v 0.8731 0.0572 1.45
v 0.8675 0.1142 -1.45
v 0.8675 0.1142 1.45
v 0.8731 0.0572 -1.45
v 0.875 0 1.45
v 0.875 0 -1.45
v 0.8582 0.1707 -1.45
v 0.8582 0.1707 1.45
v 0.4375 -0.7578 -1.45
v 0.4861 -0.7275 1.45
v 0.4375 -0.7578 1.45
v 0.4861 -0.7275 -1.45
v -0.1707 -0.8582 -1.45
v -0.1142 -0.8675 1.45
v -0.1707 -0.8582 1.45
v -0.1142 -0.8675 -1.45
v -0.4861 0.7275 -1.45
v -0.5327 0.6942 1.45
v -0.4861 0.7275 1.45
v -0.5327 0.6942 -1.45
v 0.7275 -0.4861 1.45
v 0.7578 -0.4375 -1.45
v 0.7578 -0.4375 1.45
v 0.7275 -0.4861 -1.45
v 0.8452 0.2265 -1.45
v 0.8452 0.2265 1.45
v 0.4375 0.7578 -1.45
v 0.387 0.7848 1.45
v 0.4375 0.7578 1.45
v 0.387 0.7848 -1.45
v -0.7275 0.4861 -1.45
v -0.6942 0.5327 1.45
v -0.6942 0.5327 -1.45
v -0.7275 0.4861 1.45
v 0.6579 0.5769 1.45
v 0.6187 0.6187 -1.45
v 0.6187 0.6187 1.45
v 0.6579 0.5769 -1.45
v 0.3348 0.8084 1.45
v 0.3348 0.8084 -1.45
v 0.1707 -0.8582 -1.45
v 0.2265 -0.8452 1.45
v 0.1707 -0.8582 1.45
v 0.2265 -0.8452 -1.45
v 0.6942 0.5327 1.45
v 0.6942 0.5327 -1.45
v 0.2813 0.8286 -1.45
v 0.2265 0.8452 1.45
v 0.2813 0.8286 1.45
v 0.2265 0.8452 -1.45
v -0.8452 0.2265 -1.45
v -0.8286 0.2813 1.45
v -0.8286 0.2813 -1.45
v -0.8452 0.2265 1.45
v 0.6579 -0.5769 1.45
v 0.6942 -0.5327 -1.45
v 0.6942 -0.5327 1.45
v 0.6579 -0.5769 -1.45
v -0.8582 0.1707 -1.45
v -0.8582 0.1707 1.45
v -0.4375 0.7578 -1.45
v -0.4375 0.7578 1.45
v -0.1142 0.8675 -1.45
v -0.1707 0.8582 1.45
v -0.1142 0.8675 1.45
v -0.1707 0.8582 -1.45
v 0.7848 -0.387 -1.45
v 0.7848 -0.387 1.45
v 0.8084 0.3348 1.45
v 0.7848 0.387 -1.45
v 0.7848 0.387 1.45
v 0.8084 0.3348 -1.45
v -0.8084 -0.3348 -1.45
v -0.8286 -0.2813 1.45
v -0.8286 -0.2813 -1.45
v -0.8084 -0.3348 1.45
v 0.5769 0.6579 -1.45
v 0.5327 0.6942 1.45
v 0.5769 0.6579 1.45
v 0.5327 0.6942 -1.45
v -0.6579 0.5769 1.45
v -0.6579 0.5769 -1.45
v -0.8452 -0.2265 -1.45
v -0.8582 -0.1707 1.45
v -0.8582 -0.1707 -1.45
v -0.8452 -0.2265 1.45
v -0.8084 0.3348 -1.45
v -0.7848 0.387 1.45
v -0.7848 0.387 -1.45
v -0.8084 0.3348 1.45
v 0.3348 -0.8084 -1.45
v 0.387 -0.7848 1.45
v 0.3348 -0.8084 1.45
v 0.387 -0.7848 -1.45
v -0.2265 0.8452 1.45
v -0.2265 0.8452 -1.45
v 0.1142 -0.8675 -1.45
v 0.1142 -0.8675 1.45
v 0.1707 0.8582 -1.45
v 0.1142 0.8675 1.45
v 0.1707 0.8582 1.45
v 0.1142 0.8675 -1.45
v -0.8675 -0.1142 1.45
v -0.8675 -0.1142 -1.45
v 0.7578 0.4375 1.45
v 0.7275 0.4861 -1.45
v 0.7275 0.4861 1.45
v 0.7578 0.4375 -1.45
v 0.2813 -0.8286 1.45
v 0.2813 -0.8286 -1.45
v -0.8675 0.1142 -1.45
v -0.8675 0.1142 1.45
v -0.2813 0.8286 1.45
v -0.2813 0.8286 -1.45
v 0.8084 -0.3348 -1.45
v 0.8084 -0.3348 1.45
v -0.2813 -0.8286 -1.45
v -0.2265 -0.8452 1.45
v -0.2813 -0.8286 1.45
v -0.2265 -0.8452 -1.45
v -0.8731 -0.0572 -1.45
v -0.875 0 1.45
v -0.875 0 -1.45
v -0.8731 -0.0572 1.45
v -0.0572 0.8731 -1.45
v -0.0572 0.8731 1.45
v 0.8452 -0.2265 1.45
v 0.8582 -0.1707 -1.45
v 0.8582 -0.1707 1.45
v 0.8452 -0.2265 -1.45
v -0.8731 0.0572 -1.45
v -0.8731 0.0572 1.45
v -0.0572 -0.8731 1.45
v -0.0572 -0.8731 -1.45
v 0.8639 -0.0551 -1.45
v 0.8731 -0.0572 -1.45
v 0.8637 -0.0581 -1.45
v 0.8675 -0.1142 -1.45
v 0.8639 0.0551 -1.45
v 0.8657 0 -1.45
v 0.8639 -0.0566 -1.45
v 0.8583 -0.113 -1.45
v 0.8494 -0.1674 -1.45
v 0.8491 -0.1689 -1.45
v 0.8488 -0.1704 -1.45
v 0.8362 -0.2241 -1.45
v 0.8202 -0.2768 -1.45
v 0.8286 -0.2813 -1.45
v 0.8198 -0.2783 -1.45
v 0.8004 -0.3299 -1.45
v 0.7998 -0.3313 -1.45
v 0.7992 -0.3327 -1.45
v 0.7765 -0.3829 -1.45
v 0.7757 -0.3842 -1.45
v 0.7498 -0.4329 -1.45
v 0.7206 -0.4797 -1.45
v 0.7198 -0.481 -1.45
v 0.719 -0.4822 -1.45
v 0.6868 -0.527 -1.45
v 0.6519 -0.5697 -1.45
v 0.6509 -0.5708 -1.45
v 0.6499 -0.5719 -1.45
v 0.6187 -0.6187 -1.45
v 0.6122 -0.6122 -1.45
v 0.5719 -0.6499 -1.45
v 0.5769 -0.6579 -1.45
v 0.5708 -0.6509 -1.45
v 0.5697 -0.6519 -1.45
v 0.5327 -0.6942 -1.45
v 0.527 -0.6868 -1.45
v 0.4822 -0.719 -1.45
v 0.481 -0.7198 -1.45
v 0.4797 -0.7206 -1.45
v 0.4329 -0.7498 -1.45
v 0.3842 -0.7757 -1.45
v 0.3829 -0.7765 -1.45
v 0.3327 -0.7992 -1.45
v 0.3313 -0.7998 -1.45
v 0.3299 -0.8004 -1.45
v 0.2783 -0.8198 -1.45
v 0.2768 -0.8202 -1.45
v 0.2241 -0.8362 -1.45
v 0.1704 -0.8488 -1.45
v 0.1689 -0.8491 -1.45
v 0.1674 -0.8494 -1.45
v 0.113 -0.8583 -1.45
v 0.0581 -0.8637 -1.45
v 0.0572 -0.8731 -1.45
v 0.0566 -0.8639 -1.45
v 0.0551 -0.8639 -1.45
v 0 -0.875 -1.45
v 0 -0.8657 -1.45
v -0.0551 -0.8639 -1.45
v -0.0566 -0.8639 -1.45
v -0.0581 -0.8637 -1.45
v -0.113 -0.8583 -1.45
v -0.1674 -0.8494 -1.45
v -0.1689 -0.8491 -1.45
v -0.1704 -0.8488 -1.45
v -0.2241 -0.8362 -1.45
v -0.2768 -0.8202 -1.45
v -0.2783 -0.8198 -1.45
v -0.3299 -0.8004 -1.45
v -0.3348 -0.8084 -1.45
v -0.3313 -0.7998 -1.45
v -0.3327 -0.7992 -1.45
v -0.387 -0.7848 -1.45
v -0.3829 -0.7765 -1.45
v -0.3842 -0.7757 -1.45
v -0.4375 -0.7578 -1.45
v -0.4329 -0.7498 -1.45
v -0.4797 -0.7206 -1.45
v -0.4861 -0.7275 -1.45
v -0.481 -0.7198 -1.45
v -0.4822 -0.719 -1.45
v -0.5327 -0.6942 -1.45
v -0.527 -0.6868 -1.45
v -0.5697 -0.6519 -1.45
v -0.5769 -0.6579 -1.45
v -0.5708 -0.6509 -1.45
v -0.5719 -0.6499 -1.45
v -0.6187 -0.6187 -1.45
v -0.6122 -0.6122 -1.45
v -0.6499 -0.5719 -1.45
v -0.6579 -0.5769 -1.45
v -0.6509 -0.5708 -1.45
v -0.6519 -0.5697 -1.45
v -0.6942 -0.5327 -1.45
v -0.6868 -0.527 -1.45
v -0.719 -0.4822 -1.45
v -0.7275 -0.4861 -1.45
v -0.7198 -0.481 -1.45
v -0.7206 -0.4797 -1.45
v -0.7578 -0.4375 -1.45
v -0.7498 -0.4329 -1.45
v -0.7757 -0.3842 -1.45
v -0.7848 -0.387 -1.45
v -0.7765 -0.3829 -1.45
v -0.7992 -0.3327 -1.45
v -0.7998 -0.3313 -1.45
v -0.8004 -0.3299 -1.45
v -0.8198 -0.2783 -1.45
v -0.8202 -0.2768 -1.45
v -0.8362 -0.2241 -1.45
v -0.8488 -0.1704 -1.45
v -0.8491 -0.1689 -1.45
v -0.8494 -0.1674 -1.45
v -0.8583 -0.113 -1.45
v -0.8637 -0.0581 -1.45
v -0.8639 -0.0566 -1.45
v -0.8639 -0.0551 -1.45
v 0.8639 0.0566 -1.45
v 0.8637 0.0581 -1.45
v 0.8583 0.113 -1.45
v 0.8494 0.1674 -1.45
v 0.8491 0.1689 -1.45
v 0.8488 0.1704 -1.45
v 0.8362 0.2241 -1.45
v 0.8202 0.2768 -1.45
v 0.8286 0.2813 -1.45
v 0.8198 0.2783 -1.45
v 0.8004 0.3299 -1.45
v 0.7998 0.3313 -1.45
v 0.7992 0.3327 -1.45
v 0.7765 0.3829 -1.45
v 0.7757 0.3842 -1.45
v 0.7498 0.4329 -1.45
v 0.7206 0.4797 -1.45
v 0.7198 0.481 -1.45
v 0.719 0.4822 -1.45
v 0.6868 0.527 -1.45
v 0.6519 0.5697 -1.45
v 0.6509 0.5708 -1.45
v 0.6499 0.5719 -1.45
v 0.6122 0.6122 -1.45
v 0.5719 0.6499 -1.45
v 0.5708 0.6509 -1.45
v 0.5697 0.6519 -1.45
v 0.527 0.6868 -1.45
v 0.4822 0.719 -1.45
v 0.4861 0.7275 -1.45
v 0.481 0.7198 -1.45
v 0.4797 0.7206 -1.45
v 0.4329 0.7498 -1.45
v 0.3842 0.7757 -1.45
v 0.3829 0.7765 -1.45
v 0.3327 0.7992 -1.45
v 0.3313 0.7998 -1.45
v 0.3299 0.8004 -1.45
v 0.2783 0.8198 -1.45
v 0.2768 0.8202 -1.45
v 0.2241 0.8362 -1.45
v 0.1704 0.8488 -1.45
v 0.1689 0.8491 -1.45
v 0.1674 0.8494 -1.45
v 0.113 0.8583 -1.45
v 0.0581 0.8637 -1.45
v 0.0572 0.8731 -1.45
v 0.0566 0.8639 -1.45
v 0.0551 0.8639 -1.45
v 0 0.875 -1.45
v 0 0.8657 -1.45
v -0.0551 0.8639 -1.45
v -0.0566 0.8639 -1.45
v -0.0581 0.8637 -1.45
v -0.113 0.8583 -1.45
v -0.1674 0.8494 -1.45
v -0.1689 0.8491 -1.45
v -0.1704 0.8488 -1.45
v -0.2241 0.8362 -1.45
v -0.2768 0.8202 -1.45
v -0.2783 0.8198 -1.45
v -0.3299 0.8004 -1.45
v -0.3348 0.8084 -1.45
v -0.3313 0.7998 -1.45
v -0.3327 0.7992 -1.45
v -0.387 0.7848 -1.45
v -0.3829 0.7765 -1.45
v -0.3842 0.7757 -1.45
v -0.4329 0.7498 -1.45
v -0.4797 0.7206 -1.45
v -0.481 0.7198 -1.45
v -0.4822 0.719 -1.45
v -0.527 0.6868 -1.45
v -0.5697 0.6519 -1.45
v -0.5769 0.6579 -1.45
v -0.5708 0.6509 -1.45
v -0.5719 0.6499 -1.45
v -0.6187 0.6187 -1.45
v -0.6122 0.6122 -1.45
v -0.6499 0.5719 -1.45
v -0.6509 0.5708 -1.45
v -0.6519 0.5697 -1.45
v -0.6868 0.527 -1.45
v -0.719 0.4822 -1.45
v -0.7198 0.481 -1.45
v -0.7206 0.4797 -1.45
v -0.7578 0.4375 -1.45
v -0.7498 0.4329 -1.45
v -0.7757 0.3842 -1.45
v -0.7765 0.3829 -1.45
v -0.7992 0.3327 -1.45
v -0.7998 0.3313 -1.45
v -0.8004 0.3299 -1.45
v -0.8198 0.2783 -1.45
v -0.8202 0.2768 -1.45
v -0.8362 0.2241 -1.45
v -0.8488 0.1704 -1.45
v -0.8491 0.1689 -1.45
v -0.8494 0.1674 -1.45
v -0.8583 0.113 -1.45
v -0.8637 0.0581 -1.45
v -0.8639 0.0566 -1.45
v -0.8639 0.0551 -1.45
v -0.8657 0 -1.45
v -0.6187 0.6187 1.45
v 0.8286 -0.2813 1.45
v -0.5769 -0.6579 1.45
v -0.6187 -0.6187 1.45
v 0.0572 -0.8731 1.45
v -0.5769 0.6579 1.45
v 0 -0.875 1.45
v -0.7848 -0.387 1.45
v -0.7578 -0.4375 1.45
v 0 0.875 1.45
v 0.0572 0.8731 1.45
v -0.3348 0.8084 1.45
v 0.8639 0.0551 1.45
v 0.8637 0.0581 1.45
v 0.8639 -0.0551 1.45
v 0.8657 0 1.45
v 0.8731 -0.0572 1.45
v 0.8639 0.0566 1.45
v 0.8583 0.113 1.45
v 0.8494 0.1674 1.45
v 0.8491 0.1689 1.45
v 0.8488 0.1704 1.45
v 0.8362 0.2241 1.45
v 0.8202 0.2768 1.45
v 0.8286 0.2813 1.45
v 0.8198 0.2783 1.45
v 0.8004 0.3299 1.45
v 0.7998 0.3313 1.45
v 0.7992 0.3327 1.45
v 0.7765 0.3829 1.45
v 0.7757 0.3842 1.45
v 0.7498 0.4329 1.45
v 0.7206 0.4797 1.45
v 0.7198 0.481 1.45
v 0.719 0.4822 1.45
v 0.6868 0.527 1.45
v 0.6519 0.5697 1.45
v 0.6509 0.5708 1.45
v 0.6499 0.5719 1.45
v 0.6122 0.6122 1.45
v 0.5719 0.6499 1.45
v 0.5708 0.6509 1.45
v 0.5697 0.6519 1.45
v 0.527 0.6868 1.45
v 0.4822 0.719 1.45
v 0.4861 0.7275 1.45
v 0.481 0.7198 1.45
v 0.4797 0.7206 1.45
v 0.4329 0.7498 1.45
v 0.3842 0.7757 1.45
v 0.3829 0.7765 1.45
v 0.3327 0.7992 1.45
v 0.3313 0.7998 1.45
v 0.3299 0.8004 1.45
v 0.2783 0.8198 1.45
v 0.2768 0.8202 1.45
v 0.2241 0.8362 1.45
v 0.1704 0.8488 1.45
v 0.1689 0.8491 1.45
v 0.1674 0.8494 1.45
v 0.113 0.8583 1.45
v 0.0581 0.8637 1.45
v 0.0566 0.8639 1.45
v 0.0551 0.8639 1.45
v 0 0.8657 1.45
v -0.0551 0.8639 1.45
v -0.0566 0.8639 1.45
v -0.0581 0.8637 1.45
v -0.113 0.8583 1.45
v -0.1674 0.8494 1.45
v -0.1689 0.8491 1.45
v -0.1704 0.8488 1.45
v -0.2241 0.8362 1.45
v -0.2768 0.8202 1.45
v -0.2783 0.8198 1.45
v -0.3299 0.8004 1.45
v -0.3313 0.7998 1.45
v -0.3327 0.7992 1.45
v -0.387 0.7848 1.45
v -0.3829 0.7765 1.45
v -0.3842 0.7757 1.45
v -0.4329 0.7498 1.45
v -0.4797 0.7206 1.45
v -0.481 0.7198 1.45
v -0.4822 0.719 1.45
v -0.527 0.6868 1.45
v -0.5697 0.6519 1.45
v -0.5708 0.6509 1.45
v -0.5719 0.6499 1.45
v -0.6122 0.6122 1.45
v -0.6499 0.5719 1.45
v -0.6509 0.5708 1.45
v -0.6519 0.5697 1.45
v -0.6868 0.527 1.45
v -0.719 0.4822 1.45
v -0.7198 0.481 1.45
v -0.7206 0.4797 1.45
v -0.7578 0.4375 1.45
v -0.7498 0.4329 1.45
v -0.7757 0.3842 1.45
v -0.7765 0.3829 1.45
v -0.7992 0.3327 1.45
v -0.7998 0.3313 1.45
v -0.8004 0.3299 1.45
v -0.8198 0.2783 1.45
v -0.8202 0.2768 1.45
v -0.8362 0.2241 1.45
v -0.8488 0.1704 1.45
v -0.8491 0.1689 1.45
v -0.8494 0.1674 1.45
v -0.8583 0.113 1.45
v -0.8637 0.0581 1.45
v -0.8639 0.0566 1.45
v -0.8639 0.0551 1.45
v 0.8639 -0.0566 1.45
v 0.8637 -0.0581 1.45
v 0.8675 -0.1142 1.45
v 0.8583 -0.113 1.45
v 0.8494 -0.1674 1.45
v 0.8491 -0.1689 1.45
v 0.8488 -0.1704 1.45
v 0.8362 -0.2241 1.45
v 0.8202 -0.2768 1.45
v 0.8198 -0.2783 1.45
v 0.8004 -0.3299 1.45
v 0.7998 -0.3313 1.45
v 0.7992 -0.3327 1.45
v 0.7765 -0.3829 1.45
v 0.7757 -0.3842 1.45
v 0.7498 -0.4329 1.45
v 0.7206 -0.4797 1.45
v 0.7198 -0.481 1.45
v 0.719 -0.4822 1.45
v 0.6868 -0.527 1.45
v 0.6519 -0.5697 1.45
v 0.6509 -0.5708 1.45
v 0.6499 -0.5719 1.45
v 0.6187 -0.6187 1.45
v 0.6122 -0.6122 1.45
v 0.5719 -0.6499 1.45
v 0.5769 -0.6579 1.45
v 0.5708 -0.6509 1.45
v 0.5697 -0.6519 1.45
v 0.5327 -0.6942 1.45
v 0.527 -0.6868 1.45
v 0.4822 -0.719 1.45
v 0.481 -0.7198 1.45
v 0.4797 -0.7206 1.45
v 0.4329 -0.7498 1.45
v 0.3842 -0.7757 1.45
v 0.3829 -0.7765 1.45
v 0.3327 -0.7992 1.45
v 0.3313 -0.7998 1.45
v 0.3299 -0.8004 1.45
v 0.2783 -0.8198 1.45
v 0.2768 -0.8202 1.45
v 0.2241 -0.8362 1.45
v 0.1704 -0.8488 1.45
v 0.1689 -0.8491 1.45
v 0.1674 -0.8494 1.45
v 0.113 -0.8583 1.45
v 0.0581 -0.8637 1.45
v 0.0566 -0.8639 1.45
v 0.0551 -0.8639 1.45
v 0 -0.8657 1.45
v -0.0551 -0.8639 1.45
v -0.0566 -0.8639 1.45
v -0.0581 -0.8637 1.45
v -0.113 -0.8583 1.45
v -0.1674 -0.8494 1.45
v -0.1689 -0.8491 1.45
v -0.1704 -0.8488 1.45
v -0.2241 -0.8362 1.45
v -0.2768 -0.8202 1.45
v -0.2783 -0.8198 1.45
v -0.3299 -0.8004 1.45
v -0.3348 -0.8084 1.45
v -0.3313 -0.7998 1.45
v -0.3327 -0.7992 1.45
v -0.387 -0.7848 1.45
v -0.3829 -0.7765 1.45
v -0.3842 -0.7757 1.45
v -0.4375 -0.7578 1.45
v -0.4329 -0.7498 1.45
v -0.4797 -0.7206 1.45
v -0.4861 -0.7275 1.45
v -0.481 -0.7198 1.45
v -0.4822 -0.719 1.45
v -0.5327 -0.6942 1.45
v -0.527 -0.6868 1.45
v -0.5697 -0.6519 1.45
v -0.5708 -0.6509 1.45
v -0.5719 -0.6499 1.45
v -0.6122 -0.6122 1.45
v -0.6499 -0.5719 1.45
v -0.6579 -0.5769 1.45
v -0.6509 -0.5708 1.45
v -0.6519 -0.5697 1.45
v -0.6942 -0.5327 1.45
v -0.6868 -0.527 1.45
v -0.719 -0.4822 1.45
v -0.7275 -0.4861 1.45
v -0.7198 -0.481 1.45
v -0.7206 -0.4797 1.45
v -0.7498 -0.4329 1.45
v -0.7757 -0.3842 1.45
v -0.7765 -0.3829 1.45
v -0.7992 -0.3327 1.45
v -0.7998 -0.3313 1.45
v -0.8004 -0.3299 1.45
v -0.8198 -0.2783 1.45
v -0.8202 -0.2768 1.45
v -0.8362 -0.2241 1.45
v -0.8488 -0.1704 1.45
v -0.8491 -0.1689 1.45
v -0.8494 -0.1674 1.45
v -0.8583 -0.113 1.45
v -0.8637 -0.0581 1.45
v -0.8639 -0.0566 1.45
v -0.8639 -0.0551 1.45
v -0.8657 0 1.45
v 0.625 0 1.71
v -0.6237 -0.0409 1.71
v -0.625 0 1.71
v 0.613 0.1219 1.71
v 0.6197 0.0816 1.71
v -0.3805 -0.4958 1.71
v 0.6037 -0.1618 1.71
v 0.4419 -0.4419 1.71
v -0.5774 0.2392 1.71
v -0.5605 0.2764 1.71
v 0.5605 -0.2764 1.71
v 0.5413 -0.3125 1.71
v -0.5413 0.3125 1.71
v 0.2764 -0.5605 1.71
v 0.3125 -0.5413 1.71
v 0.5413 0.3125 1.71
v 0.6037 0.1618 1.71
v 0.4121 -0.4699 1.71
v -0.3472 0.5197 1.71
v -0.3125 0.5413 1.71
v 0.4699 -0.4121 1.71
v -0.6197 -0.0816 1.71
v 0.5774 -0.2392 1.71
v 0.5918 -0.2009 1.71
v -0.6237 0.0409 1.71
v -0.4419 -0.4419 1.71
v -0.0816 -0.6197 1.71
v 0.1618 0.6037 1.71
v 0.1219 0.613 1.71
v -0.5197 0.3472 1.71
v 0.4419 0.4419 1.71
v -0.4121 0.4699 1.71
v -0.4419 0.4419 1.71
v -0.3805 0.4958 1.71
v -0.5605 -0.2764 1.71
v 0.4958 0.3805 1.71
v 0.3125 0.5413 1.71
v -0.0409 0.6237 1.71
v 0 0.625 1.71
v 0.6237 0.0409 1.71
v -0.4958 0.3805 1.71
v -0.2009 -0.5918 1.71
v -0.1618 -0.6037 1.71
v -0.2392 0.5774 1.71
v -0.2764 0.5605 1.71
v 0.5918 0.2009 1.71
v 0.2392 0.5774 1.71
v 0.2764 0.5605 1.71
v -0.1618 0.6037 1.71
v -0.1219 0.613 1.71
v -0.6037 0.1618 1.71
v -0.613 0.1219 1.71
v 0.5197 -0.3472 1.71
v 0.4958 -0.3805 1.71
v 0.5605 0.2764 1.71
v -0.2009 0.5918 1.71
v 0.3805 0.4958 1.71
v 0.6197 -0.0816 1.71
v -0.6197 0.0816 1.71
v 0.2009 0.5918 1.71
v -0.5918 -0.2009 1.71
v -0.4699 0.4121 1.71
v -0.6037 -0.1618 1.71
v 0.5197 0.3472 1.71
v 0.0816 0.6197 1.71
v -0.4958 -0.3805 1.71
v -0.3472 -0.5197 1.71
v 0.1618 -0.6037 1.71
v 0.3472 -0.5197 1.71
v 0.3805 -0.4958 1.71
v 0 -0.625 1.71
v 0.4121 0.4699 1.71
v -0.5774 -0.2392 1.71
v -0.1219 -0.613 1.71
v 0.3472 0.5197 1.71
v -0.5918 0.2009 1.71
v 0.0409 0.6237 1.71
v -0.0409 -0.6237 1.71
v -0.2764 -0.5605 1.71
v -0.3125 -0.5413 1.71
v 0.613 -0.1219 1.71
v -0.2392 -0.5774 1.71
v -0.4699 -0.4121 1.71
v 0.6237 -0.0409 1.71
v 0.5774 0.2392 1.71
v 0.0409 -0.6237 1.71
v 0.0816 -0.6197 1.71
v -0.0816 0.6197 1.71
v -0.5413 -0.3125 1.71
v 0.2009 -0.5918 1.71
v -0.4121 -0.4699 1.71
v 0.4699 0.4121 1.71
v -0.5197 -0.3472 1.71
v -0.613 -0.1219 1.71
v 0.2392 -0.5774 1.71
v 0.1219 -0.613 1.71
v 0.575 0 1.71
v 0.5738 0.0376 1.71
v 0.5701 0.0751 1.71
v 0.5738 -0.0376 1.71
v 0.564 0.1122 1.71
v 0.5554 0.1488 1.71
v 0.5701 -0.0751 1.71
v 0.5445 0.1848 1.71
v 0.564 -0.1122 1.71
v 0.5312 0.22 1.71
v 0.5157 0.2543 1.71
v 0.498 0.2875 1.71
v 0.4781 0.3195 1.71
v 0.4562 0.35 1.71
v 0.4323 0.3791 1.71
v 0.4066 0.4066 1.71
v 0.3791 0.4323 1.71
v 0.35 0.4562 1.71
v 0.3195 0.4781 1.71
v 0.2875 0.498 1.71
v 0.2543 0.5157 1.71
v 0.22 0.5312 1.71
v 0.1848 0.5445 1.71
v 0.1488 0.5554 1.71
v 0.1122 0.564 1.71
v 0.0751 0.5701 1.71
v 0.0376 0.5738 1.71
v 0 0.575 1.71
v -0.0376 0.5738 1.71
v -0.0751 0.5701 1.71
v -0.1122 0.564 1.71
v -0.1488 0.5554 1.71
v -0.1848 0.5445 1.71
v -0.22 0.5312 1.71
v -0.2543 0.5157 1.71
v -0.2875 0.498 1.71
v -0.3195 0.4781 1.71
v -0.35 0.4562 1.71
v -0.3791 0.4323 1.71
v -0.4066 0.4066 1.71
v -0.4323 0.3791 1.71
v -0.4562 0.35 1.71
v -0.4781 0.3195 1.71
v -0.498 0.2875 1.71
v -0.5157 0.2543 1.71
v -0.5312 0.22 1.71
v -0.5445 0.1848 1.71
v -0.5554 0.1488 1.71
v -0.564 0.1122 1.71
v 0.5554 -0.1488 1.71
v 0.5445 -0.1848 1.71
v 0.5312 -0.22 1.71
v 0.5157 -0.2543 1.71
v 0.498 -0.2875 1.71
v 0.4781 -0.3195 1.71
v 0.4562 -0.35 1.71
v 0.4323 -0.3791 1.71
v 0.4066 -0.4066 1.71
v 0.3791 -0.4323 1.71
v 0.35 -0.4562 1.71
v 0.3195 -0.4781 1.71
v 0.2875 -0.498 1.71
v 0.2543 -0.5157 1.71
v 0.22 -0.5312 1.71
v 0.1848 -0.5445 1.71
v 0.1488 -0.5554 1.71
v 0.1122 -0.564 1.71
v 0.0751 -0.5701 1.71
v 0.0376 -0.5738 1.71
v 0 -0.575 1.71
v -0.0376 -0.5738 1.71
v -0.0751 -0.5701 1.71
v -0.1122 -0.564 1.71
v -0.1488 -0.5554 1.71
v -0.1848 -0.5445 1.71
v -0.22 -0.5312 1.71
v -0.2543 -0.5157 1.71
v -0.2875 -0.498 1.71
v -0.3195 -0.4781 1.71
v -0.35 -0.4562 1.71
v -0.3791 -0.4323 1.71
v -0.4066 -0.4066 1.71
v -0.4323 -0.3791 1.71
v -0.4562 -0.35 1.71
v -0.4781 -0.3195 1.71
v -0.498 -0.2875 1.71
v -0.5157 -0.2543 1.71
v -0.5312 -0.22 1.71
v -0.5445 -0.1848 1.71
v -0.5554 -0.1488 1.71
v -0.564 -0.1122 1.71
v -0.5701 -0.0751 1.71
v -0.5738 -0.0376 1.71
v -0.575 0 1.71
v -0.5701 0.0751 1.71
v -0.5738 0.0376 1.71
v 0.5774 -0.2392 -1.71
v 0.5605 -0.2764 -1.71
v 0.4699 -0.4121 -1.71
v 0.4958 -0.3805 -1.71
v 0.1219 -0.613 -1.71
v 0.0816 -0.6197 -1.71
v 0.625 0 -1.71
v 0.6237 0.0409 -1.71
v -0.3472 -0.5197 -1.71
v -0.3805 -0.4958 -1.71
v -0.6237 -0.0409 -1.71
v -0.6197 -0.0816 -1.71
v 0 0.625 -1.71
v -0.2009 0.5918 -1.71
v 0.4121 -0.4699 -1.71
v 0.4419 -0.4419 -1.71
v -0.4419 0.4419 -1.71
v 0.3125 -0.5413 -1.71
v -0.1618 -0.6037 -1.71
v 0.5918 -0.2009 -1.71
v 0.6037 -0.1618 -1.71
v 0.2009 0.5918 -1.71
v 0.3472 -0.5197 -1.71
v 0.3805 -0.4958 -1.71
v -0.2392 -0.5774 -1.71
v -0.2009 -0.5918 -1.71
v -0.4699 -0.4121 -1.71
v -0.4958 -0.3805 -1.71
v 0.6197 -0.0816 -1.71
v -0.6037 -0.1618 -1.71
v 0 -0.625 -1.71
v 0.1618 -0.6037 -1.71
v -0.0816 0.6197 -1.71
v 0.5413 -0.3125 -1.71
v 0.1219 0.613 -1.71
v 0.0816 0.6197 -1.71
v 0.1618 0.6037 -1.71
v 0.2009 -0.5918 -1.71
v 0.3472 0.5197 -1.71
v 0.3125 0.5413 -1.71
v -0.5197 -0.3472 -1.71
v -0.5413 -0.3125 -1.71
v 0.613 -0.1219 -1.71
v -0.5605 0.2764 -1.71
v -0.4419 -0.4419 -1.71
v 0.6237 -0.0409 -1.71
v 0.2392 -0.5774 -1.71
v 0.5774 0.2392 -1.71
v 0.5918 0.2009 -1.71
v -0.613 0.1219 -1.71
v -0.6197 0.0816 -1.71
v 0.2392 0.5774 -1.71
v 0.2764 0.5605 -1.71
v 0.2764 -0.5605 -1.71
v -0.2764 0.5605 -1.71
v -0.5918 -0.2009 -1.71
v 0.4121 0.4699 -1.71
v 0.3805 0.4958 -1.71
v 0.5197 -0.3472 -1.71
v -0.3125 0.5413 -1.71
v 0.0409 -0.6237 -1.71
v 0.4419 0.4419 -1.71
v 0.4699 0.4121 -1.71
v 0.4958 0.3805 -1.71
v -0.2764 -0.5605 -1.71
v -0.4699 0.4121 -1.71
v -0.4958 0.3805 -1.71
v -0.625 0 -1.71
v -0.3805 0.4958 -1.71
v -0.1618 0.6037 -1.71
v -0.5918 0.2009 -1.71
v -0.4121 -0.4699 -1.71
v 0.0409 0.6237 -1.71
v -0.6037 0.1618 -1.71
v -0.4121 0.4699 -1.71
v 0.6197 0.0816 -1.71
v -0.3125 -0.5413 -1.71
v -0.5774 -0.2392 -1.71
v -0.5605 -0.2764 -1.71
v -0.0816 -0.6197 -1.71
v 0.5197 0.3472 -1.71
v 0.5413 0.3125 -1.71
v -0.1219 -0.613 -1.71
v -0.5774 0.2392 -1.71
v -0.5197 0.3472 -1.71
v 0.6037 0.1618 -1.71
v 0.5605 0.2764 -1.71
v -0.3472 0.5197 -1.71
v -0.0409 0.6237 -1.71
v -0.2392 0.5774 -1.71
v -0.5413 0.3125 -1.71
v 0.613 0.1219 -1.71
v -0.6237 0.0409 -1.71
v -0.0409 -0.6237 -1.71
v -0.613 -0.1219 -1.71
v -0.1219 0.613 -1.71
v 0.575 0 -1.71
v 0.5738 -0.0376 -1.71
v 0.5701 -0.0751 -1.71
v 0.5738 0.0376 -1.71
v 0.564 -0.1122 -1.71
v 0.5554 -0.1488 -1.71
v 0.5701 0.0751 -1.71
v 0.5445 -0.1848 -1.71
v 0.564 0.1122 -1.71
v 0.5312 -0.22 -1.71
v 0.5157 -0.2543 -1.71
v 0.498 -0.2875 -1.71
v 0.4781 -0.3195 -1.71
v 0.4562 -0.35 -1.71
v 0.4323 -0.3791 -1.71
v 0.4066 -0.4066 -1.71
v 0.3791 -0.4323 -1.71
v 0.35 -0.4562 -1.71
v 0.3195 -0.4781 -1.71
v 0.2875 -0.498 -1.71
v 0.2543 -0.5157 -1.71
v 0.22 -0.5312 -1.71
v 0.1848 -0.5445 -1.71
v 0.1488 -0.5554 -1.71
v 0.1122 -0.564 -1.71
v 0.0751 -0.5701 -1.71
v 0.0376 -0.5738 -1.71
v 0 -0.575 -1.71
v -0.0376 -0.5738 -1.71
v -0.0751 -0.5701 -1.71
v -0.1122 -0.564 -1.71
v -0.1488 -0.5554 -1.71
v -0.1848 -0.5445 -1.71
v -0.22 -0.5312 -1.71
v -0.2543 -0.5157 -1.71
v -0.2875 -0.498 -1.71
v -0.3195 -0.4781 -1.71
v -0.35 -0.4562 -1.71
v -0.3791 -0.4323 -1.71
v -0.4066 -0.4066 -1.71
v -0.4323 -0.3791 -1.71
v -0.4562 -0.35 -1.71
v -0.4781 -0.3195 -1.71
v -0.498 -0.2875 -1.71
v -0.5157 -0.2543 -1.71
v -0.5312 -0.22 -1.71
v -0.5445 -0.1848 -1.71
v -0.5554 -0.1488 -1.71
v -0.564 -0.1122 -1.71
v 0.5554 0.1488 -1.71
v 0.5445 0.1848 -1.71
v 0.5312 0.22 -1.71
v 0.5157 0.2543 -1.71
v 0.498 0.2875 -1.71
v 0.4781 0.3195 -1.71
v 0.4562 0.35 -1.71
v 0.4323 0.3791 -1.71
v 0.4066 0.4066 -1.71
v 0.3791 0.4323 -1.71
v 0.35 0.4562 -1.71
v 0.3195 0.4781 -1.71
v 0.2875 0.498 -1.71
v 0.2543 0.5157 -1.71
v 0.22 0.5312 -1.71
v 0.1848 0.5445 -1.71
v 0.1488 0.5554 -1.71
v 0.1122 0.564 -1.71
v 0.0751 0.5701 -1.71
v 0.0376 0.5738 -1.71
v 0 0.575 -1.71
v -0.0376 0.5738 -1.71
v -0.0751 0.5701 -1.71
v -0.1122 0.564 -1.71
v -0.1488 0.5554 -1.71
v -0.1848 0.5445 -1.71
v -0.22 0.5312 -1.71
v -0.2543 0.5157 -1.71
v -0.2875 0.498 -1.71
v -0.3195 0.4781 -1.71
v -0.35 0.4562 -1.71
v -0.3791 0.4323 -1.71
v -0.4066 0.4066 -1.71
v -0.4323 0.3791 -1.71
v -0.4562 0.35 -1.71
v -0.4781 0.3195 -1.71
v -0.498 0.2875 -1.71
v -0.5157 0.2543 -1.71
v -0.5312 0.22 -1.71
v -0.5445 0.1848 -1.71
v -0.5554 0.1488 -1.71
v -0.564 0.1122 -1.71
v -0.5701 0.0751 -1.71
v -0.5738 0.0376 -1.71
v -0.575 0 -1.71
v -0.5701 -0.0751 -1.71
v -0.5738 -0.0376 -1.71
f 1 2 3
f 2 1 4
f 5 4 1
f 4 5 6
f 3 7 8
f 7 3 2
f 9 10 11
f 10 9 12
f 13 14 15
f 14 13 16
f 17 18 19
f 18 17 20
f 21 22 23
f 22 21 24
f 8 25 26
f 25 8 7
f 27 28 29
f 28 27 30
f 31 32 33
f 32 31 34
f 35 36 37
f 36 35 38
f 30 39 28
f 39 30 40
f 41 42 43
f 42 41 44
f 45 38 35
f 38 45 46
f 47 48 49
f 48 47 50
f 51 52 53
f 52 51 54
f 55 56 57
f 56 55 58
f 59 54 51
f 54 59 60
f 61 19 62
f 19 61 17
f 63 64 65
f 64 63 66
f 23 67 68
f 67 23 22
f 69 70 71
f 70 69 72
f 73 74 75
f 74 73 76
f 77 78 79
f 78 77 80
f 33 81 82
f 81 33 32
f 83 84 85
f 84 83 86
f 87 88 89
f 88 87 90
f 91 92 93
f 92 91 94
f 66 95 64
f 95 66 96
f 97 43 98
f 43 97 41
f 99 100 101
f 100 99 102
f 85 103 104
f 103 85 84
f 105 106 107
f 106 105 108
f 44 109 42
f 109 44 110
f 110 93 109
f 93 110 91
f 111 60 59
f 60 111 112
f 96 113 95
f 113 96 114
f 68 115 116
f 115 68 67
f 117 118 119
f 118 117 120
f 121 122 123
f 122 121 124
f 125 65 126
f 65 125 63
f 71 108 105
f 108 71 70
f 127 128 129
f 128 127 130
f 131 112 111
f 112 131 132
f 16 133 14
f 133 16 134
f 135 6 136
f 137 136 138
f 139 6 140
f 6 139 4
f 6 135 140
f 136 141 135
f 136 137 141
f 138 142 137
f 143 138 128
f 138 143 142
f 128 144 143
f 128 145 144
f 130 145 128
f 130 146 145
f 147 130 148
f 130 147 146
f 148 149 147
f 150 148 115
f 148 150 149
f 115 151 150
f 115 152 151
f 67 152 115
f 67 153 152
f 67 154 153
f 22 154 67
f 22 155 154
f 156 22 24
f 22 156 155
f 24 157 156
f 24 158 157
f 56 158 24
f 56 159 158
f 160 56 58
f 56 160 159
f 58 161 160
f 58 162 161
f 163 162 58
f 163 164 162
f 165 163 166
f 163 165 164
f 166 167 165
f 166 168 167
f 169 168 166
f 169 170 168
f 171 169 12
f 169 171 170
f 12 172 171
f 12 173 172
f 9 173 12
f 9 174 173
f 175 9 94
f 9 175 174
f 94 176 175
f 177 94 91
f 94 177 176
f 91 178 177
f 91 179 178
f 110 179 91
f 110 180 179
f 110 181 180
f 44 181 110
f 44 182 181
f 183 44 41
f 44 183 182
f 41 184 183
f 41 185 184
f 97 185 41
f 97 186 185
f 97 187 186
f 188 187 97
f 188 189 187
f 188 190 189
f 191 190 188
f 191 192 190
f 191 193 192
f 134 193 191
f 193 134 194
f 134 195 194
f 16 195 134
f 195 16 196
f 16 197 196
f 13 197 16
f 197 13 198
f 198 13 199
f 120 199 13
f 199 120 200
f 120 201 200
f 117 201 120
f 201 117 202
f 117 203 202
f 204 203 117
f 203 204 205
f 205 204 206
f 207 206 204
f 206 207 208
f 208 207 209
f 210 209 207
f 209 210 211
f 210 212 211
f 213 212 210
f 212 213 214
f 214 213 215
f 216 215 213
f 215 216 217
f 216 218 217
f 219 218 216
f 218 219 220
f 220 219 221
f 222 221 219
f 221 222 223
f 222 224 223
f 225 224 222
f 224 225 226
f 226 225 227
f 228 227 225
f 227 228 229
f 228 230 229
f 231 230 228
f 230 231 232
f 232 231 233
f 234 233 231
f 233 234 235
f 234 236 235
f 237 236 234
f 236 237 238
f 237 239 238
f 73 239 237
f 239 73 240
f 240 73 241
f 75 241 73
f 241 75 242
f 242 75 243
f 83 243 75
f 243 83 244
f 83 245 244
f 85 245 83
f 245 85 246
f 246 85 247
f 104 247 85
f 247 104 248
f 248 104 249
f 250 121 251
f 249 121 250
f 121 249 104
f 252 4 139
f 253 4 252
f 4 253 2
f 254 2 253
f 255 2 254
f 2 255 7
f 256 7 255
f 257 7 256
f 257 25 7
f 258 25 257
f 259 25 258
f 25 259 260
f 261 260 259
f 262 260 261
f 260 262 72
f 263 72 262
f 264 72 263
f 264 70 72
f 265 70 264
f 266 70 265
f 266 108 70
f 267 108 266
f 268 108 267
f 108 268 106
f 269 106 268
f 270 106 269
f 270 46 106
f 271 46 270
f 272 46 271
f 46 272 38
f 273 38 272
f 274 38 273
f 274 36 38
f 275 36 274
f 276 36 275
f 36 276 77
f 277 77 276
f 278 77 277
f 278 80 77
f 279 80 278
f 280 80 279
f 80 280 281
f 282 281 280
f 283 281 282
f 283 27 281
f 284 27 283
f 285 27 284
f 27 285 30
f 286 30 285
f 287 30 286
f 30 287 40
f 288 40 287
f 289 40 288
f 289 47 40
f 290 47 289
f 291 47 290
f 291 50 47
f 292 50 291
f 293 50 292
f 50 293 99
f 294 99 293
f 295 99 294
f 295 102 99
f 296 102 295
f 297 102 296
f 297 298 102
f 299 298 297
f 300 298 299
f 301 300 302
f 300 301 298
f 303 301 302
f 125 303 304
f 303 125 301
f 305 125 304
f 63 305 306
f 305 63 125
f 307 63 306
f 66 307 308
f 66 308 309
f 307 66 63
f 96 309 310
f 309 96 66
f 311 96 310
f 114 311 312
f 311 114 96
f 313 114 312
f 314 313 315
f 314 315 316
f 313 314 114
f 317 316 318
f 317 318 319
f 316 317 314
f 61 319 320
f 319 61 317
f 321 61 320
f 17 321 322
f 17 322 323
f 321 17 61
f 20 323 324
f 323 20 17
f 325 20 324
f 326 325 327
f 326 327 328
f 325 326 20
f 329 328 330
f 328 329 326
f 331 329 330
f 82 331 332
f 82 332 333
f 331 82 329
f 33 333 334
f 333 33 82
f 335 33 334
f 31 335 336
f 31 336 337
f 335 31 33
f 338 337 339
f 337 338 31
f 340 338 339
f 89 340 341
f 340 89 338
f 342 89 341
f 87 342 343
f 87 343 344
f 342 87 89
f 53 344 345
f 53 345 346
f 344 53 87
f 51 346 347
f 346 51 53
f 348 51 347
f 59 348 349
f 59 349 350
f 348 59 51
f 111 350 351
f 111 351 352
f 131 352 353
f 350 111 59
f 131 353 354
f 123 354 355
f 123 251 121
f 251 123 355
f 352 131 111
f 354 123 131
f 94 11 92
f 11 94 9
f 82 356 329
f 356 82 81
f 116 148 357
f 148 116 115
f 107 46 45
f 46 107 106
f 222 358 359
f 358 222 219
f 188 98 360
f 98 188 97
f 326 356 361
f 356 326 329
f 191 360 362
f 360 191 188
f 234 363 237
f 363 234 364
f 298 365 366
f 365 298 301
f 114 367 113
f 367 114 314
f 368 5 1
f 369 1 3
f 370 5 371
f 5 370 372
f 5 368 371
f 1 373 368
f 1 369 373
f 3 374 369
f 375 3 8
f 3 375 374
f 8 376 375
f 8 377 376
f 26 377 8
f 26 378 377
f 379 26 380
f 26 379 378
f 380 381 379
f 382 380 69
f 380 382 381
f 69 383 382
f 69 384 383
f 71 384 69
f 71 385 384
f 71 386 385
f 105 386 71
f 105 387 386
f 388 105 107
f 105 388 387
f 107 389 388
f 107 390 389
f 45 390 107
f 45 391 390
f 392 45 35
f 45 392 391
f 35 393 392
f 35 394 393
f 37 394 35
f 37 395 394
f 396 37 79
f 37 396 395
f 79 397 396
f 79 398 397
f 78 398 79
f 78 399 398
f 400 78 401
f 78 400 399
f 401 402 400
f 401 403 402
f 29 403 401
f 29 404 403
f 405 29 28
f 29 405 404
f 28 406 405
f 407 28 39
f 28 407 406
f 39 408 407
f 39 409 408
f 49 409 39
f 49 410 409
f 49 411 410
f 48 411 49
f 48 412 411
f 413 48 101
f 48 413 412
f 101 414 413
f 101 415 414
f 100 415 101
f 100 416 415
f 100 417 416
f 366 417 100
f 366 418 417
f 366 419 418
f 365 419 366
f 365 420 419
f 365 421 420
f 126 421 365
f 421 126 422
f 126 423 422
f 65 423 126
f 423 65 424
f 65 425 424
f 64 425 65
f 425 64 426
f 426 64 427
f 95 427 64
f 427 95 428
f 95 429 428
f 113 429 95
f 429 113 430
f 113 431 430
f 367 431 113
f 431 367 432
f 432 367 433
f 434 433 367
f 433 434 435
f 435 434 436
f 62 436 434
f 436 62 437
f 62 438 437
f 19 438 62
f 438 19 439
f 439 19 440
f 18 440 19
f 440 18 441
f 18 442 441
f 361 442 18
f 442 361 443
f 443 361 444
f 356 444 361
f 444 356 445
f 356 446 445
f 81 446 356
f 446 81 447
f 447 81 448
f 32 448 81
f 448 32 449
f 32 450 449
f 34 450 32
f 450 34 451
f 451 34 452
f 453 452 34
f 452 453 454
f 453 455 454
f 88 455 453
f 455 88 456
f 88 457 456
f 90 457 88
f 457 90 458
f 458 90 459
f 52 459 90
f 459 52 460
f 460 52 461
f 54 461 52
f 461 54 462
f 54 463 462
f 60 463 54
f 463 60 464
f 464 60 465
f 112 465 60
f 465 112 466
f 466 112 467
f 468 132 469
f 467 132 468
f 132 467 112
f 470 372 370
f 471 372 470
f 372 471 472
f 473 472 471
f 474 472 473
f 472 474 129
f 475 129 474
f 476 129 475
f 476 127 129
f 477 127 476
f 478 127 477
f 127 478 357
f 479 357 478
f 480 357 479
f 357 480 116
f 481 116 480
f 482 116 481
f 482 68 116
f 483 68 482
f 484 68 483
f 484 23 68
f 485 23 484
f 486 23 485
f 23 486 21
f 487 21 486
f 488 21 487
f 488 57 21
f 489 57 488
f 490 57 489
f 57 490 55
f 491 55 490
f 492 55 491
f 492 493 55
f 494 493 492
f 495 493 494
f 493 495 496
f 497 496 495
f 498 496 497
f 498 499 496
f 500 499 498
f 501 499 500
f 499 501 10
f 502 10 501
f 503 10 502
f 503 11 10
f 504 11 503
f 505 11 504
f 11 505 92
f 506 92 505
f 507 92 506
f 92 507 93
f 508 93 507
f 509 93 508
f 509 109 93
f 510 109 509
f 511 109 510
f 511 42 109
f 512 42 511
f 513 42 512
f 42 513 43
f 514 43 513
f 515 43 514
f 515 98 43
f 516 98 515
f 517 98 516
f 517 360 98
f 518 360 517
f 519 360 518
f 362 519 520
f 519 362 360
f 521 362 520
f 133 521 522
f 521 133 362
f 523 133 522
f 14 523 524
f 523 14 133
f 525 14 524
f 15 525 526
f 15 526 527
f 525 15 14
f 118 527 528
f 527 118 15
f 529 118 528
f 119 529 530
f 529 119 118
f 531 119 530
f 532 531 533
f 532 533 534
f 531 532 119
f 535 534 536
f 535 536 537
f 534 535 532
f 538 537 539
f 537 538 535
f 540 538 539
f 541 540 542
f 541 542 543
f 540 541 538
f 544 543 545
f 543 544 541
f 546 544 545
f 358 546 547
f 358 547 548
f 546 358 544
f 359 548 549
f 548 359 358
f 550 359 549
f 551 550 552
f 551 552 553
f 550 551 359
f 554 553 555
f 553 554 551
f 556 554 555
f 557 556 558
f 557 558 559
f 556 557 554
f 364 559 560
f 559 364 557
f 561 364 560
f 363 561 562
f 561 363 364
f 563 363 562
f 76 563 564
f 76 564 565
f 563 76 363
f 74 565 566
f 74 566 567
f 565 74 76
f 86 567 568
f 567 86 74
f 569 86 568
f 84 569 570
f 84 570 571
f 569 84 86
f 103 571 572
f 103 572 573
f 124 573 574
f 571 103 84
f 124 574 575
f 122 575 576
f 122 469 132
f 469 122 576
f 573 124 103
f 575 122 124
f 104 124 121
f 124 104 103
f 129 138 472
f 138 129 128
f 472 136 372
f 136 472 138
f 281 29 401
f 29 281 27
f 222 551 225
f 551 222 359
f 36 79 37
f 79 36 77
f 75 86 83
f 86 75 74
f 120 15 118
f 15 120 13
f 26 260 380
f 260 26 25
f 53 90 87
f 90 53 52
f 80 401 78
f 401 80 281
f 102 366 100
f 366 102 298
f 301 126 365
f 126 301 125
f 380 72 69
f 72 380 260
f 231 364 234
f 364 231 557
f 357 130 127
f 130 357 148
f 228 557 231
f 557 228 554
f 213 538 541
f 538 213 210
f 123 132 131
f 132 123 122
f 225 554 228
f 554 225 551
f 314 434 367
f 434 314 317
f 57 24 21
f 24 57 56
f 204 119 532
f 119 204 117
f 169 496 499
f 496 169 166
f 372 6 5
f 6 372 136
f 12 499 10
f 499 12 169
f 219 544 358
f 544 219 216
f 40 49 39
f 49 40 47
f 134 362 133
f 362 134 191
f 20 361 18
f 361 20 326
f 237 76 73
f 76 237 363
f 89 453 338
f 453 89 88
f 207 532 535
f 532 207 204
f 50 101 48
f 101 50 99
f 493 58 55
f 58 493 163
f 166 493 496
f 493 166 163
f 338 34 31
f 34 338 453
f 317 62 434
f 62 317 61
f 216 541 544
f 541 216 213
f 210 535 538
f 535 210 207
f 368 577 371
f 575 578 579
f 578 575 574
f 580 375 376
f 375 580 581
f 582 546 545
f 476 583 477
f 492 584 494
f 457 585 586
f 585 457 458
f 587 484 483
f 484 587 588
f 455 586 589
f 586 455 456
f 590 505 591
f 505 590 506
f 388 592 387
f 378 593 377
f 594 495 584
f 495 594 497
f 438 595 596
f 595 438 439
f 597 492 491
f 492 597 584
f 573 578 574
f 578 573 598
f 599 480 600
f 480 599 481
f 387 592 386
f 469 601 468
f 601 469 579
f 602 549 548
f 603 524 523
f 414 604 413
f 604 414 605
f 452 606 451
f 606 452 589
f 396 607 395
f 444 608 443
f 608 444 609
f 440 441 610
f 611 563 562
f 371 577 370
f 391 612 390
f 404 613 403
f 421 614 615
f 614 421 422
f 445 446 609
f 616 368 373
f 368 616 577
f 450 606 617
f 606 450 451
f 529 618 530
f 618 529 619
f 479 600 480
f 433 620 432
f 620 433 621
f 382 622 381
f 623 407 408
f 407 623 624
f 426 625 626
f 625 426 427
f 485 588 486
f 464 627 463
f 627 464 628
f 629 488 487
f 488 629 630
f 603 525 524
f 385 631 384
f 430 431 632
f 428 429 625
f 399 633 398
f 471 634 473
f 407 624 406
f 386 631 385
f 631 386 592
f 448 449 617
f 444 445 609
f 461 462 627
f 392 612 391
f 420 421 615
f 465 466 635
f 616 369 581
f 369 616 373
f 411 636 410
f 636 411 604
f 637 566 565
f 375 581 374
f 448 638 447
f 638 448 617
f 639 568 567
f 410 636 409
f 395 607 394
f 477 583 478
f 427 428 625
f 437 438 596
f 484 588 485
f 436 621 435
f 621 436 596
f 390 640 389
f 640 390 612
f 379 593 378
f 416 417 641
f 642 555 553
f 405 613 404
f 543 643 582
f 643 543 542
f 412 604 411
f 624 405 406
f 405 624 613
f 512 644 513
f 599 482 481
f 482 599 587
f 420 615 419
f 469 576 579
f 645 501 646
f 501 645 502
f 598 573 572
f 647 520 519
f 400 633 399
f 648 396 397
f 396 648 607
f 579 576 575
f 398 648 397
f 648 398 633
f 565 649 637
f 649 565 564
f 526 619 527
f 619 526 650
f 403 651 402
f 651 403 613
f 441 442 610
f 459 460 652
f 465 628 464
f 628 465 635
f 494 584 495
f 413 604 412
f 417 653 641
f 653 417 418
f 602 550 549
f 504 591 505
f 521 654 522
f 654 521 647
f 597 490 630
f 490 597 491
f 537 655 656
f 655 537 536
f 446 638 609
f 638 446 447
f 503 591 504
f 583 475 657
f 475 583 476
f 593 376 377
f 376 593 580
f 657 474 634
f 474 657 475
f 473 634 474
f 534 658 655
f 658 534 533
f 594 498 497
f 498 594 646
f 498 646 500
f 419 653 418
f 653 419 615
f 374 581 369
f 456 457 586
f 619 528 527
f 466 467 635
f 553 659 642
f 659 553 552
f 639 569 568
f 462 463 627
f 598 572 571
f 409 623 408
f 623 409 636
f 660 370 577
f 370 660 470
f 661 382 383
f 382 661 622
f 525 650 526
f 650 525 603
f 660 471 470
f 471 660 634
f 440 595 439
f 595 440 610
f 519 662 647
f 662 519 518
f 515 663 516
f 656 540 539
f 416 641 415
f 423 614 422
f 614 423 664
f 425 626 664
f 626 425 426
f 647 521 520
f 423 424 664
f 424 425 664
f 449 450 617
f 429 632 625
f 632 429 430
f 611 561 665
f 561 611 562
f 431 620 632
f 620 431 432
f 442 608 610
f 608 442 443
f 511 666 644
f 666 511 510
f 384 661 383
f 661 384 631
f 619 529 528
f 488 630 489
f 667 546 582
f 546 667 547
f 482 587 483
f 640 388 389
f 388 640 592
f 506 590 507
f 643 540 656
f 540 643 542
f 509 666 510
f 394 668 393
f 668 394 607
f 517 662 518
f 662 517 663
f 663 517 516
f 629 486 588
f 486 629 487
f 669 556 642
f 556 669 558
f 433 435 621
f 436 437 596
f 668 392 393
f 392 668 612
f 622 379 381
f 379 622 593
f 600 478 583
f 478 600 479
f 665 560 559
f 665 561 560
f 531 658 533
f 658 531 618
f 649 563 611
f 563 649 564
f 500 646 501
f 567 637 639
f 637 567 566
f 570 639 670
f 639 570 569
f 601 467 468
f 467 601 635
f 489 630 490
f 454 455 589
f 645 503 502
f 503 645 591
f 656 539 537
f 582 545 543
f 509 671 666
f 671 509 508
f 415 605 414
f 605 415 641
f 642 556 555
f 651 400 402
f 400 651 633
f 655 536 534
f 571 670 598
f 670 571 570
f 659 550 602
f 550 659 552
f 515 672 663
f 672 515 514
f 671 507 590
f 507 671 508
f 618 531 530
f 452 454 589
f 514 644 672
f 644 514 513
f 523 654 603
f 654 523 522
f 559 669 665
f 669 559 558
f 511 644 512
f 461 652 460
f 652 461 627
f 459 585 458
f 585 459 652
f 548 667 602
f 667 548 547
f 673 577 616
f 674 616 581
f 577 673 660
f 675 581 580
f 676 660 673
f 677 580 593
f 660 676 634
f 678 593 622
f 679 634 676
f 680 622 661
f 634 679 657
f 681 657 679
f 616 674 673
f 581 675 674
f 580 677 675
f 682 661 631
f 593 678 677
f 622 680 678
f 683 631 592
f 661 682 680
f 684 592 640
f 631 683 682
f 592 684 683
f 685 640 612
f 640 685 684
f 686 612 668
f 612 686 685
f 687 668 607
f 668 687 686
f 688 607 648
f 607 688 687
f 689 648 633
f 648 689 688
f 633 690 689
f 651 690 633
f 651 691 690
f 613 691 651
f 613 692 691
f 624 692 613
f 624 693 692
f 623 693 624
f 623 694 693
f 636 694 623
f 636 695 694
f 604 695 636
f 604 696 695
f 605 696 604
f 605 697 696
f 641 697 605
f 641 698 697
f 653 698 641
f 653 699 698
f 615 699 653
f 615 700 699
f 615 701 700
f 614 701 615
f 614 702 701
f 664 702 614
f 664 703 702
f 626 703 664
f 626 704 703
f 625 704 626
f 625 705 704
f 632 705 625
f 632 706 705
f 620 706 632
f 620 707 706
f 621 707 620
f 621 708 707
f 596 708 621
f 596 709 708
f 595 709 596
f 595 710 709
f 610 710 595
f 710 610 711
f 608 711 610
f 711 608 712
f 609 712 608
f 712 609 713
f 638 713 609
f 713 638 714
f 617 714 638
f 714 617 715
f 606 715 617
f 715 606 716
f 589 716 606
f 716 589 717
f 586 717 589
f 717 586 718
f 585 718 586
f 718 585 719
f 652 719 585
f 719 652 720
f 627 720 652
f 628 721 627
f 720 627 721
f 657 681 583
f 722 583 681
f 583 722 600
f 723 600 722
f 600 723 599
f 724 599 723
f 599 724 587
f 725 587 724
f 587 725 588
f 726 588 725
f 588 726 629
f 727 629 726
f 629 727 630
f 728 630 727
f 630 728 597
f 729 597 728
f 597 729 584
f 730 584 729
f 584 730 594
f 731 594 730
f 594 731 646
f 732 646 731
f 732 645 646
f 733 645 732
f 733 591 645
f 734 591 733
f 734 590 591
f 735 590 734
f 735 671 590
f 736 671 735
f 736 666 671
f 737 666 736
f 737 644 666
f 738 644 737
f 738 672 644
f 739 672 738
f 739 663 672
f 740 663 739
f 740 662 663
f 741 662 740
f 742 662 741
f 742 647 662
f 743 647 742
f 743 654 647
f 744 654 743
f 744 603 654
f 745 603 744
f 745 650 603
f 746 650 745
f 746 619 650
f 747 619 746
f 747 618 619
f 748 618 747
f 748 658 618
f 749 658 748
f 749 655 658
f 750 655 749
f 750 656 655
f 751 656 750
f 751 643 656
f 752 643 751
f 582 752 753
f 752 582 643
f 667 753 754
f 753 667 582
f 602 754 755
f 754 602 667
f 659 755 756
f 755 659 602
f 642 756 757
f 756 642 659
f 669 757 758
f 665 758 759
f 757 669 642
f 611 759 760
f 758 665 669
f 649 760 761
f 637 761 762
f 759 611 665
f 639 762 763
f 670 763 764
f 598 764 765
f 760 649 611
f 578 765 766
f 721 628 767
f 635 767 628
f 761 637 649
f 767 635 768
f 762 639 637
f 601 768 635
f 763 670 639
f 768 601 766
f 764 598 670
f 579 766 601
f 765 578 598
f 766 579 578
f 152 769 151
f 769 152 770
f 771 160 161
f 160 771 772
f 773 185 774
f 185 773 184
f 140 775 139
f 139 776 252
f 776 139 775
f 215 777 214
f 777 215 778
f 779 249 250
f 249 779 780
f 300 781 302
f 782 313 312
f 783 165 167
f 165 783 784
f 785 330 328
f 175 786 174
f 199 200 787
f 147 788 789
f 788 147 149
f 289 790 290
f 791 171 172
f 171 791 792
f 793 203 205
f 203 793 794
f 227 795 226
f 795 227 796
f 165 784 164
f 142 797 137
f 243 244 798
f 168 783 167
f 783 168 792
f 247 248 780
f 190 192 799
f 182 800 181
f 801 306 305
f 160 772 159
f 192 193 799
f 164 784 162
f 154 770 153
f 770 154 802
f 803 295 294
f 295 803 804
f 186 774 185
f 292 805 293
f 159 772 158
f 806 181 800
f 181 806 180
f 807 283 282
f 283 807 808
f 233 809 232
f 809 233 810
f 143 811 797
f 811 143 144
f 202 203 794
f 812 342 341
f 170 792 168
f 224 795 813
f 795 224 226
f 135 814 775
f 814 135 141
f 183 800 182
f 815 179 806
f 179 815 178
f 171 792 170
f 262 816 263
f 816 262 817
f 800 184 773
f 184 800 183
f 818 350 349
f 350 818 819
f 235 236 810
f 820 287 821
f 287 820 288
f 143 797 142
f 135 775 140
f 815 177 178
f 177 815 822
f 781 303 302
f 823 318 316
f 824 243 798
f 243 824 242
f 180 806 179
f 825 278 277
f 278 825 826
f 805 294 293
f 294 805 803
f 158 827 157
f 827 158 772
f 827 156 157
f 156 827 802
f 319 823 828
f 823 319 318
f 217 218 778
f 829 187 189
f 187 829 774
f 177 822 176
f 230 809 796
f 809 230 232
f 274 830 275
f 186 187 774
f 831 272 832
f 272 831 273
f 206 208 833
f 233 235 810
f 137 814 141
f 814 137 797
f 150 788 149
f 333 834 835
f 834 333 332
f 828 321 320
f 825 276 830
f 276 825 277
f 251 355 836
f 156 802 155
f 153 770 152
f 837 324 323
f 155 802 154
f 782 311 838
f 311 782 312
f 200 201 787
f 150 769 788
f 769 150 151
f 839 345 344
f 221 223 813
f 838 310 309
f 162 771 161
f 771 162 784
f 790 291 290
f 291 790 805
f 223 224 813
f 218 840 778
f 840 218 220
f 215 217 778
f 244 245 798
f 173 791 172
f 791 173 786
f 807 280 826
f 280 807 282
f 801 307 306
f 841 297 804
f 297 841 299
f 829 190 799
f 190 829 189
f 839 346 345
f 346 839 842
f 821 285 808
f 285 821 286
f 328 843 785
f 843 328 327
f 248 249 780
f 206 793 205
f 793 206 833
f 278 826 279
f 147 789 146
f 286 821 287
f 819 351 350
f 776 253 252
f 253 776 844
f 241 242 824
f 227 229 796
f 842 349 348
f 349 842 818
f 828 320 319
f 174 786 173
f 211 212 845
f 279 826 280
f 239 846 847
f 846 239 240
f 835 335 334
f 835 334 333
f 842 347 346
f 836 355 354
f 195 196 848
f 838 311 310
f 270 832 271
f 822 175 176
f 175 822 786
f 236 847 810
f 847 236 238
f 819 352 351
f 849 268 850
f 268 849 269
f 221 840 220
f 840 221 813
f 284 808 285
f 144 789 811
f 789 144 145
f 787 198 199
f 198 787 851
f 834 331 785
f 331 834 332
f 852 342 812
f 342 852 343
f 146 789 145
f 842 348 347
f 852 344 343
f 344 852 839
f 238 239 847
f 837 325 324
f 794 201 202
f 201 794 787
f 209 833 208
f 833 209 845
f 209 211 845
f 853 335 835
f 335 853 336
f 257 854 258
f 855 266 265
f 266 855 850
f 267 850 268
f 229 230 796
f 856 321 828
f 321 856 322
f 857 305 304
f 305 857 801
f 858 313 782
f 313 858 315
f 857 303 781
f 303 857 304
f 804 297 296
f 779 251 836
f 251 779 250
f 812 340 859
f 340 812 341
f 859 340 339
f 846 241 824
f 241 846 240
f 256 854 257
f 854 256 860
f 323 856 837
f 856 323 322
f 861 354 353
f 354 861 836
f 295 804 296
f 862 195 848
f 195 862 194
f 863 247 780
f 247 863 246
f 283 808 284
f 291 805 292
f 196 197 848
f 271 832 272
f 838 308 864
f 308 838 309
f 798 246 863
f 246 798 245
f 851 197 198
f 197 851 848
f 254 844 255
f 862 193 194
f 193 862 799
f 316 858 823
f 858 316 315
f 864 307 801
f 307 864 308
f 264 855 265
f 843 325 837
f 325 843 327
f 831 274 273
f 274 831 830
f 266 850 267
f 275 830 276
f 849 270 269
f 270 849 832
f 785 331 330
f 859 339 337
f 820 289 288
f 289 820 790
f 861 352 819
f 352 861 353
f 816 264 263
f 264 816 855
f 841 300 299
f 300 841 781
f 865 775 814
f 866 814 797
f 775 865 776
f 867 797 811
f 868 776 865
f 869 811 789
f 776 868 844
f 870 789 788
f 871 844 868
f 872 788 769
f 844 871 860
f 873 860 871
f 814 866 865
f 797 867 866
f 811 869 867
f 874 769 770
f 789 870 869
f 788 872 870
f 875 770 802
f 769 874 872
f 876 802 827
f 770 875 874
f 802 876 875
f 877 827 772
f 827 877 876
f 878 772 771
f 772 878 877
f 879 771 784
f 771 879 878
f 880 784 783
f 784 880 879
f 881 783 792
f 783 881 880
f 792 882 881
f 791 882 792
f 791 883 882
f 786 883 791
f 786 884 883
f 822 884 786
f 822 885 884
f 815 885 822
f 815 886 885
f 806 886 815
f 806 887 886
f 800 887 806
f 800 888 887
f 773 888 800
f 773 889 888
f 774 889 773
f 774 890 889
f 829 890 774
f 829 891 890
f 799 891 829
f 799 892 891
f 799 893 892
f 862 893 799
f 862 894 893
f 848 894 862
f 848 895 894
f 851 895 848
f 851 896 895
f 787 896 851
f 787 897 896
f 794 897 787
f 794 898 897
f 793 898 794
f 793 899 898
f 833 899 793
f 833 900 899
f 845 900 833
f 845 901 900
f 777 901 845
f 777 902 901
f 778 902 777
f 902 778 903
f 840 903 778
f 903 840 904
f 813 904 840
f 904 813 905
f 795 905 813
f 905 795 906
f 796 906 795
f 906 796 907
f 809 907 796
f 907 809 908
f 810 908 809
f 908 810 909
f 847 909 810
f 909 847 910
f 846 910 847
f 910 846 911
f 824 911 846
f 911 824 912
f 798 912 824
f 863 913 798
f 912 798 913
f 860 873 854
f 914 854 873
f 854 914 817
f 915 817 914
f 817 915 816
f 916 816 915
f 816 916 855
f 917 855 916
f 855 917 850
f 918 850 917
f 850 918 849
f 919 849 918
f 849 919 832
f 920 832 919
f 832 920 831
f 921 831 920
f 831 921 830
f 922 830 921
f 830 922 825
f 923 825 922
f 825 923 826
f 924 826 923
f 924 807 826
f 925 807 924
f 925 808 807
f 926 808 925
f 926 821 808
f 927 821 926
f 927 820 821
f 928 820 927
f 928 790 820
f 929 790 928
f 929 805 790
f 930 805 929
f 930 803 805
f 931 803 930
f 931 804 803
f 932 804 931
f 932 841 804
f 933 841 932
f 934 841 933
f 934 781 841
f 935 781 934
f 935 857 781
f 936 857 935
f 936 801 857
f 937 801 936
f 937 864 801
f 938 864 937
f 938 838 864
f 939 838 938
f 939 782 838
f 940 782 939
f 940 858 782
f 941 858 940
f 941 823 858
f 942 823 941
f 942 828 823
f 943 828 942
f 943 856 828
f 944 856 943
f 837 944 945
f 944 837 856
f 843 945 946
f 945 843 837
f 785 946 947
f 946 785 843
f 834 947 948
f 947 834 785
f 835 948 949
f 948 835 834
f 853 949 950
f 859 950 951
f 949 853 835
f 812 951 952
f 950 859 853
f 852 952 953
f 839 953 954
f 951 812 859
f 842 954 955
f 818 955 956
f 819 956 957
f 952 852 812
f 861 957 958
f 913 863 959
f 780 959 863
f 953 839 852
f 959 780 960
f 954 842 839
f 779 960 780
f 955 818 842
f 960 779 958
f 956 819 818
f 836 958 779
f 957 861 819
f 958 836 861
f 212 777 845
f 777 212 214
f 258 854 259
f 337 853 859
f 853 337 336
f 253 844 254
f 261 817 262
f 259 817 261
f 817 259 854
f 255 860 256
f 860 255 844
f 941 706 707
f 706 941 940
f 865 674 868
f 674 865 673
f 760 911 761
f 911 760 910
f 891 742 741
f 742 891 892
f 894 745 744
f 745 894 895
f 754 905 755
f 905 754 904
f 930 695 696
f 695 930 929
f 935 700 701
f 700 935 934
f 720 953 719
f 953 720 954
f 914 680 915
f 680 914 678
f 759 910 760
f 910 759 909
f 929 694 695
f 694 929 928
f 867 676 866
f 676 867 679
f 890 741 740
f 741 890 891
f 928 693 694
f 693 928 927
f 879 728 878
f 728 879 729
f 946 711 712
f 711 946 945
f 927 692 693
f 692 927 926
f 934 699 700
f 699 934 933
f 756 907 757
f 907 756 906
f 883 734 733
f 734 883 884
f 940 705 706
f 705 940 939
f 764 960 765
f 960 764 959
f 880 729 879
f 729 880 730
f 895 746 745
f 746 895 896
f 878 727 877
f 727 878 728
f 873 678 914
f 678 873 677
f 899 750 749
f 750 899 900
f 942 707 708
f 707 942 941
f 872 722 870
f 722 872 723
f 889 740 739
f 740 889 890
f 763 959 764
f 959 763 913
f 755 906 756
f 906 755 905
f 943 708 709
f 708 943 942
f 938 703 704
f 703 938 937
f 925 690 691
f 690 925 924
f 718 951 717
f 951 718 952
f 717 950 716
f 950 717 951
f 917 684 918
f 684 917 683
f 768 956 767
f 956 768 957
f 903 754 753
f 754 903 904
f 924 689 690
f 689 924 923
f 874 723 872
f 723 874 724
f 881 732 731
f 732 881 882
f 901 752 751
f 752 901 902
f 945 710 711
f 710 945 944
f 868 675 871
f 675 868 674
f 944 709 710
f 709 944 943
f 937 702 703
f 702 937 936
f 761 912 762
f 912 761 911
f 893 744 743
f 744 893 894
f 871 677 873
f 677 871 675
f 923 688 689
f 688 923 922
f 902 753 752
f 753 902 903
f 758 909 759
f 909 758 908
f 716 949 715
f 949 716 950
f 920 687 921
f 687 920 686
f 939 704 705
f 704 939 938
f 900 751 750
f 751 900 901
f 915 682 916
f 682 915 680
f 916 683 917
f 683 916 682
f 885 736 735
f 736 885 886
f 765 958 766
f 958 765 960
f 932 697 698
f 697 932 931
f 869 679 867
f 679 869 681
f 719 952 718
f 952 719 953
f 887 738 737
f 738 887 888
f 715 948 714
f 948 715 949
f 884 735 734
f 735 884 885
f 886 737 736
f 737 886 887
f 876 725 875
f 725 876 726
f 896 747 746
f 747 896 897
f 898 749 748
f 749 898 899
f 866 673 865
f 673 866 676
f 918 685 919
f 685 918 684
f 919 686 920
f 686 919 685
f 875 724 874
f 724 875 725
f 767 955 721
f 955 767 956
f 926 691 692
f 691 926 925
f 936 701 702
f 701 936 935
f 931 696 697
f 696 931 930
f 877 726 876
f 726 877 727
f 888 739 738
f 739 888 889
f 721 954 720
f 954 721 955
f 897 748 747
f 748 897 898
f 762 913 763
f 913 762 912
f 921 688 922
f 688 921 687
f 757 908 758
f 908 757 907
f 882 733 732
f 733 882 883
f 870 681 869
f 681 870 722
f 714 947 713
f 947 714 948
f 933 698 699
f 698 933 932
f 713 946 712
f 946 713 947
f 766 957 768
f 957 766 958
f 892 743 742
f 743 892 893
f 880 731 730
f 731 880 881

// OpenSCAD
// A axial: [3.4, 1.75, 0.3]
// Simple, clearly axial (rotationally symmetric) part:
// - Outer cylinder: length = 3.4, OD = 1.75
// - Central through-bore sized by wall_thickness (0.3) -> ID = OD - 2*wall
// - Small end chamfers for a clean silhouette
// All geometry is a single connected solid; no floating parts.

$fn = 96;

// Parameters (match request)
body_length     = 3.4;   // axial length
body_od         = 1.75;  // outer diameter
wall_thickness  = 0.3;   // radial wall thickness (sets bore)

// Derived
body_r  = body_od/2;
body_id = max(0.01, body_od - 2*wall_thickness);
bore_r  = body_id/2;

// Small, proportional chamfer (kept simple)
chamfer_len = min(0.25, body_length*0.12);
eps = 0.02; // slight overlap for robust booleans

module axial_part() {
  difference() {
    // Outer body with simple end chamfers (still rotationally symmetric)
    union() {
      // Main straight section
      cylinder(h = body_length - 2*chamfer_len, r = body_r, center = true);

      // Top chamfer frustum
      translate([0,0,(body_length/2 - chamfer_len/2)])
        cylinder(h = chamfer_len + eps, r1 = body_r, r2 = max(0.01, body_r - chamfer_len), center = true);

      // Bottom chamfer frustum
      translate([0,0,(-body_length/2 + chamfer_len/2)])
        cylinder(h = chamfer_len + eps, r1 = max(0.01, body_r - chamfer_len), r2 = body_r, center = true);
    }

    // Central through-bore (axial feature)
    cylinder(h = body_length + 2*eps, r = bore_r, center = true);
  }
}

axial_part();
